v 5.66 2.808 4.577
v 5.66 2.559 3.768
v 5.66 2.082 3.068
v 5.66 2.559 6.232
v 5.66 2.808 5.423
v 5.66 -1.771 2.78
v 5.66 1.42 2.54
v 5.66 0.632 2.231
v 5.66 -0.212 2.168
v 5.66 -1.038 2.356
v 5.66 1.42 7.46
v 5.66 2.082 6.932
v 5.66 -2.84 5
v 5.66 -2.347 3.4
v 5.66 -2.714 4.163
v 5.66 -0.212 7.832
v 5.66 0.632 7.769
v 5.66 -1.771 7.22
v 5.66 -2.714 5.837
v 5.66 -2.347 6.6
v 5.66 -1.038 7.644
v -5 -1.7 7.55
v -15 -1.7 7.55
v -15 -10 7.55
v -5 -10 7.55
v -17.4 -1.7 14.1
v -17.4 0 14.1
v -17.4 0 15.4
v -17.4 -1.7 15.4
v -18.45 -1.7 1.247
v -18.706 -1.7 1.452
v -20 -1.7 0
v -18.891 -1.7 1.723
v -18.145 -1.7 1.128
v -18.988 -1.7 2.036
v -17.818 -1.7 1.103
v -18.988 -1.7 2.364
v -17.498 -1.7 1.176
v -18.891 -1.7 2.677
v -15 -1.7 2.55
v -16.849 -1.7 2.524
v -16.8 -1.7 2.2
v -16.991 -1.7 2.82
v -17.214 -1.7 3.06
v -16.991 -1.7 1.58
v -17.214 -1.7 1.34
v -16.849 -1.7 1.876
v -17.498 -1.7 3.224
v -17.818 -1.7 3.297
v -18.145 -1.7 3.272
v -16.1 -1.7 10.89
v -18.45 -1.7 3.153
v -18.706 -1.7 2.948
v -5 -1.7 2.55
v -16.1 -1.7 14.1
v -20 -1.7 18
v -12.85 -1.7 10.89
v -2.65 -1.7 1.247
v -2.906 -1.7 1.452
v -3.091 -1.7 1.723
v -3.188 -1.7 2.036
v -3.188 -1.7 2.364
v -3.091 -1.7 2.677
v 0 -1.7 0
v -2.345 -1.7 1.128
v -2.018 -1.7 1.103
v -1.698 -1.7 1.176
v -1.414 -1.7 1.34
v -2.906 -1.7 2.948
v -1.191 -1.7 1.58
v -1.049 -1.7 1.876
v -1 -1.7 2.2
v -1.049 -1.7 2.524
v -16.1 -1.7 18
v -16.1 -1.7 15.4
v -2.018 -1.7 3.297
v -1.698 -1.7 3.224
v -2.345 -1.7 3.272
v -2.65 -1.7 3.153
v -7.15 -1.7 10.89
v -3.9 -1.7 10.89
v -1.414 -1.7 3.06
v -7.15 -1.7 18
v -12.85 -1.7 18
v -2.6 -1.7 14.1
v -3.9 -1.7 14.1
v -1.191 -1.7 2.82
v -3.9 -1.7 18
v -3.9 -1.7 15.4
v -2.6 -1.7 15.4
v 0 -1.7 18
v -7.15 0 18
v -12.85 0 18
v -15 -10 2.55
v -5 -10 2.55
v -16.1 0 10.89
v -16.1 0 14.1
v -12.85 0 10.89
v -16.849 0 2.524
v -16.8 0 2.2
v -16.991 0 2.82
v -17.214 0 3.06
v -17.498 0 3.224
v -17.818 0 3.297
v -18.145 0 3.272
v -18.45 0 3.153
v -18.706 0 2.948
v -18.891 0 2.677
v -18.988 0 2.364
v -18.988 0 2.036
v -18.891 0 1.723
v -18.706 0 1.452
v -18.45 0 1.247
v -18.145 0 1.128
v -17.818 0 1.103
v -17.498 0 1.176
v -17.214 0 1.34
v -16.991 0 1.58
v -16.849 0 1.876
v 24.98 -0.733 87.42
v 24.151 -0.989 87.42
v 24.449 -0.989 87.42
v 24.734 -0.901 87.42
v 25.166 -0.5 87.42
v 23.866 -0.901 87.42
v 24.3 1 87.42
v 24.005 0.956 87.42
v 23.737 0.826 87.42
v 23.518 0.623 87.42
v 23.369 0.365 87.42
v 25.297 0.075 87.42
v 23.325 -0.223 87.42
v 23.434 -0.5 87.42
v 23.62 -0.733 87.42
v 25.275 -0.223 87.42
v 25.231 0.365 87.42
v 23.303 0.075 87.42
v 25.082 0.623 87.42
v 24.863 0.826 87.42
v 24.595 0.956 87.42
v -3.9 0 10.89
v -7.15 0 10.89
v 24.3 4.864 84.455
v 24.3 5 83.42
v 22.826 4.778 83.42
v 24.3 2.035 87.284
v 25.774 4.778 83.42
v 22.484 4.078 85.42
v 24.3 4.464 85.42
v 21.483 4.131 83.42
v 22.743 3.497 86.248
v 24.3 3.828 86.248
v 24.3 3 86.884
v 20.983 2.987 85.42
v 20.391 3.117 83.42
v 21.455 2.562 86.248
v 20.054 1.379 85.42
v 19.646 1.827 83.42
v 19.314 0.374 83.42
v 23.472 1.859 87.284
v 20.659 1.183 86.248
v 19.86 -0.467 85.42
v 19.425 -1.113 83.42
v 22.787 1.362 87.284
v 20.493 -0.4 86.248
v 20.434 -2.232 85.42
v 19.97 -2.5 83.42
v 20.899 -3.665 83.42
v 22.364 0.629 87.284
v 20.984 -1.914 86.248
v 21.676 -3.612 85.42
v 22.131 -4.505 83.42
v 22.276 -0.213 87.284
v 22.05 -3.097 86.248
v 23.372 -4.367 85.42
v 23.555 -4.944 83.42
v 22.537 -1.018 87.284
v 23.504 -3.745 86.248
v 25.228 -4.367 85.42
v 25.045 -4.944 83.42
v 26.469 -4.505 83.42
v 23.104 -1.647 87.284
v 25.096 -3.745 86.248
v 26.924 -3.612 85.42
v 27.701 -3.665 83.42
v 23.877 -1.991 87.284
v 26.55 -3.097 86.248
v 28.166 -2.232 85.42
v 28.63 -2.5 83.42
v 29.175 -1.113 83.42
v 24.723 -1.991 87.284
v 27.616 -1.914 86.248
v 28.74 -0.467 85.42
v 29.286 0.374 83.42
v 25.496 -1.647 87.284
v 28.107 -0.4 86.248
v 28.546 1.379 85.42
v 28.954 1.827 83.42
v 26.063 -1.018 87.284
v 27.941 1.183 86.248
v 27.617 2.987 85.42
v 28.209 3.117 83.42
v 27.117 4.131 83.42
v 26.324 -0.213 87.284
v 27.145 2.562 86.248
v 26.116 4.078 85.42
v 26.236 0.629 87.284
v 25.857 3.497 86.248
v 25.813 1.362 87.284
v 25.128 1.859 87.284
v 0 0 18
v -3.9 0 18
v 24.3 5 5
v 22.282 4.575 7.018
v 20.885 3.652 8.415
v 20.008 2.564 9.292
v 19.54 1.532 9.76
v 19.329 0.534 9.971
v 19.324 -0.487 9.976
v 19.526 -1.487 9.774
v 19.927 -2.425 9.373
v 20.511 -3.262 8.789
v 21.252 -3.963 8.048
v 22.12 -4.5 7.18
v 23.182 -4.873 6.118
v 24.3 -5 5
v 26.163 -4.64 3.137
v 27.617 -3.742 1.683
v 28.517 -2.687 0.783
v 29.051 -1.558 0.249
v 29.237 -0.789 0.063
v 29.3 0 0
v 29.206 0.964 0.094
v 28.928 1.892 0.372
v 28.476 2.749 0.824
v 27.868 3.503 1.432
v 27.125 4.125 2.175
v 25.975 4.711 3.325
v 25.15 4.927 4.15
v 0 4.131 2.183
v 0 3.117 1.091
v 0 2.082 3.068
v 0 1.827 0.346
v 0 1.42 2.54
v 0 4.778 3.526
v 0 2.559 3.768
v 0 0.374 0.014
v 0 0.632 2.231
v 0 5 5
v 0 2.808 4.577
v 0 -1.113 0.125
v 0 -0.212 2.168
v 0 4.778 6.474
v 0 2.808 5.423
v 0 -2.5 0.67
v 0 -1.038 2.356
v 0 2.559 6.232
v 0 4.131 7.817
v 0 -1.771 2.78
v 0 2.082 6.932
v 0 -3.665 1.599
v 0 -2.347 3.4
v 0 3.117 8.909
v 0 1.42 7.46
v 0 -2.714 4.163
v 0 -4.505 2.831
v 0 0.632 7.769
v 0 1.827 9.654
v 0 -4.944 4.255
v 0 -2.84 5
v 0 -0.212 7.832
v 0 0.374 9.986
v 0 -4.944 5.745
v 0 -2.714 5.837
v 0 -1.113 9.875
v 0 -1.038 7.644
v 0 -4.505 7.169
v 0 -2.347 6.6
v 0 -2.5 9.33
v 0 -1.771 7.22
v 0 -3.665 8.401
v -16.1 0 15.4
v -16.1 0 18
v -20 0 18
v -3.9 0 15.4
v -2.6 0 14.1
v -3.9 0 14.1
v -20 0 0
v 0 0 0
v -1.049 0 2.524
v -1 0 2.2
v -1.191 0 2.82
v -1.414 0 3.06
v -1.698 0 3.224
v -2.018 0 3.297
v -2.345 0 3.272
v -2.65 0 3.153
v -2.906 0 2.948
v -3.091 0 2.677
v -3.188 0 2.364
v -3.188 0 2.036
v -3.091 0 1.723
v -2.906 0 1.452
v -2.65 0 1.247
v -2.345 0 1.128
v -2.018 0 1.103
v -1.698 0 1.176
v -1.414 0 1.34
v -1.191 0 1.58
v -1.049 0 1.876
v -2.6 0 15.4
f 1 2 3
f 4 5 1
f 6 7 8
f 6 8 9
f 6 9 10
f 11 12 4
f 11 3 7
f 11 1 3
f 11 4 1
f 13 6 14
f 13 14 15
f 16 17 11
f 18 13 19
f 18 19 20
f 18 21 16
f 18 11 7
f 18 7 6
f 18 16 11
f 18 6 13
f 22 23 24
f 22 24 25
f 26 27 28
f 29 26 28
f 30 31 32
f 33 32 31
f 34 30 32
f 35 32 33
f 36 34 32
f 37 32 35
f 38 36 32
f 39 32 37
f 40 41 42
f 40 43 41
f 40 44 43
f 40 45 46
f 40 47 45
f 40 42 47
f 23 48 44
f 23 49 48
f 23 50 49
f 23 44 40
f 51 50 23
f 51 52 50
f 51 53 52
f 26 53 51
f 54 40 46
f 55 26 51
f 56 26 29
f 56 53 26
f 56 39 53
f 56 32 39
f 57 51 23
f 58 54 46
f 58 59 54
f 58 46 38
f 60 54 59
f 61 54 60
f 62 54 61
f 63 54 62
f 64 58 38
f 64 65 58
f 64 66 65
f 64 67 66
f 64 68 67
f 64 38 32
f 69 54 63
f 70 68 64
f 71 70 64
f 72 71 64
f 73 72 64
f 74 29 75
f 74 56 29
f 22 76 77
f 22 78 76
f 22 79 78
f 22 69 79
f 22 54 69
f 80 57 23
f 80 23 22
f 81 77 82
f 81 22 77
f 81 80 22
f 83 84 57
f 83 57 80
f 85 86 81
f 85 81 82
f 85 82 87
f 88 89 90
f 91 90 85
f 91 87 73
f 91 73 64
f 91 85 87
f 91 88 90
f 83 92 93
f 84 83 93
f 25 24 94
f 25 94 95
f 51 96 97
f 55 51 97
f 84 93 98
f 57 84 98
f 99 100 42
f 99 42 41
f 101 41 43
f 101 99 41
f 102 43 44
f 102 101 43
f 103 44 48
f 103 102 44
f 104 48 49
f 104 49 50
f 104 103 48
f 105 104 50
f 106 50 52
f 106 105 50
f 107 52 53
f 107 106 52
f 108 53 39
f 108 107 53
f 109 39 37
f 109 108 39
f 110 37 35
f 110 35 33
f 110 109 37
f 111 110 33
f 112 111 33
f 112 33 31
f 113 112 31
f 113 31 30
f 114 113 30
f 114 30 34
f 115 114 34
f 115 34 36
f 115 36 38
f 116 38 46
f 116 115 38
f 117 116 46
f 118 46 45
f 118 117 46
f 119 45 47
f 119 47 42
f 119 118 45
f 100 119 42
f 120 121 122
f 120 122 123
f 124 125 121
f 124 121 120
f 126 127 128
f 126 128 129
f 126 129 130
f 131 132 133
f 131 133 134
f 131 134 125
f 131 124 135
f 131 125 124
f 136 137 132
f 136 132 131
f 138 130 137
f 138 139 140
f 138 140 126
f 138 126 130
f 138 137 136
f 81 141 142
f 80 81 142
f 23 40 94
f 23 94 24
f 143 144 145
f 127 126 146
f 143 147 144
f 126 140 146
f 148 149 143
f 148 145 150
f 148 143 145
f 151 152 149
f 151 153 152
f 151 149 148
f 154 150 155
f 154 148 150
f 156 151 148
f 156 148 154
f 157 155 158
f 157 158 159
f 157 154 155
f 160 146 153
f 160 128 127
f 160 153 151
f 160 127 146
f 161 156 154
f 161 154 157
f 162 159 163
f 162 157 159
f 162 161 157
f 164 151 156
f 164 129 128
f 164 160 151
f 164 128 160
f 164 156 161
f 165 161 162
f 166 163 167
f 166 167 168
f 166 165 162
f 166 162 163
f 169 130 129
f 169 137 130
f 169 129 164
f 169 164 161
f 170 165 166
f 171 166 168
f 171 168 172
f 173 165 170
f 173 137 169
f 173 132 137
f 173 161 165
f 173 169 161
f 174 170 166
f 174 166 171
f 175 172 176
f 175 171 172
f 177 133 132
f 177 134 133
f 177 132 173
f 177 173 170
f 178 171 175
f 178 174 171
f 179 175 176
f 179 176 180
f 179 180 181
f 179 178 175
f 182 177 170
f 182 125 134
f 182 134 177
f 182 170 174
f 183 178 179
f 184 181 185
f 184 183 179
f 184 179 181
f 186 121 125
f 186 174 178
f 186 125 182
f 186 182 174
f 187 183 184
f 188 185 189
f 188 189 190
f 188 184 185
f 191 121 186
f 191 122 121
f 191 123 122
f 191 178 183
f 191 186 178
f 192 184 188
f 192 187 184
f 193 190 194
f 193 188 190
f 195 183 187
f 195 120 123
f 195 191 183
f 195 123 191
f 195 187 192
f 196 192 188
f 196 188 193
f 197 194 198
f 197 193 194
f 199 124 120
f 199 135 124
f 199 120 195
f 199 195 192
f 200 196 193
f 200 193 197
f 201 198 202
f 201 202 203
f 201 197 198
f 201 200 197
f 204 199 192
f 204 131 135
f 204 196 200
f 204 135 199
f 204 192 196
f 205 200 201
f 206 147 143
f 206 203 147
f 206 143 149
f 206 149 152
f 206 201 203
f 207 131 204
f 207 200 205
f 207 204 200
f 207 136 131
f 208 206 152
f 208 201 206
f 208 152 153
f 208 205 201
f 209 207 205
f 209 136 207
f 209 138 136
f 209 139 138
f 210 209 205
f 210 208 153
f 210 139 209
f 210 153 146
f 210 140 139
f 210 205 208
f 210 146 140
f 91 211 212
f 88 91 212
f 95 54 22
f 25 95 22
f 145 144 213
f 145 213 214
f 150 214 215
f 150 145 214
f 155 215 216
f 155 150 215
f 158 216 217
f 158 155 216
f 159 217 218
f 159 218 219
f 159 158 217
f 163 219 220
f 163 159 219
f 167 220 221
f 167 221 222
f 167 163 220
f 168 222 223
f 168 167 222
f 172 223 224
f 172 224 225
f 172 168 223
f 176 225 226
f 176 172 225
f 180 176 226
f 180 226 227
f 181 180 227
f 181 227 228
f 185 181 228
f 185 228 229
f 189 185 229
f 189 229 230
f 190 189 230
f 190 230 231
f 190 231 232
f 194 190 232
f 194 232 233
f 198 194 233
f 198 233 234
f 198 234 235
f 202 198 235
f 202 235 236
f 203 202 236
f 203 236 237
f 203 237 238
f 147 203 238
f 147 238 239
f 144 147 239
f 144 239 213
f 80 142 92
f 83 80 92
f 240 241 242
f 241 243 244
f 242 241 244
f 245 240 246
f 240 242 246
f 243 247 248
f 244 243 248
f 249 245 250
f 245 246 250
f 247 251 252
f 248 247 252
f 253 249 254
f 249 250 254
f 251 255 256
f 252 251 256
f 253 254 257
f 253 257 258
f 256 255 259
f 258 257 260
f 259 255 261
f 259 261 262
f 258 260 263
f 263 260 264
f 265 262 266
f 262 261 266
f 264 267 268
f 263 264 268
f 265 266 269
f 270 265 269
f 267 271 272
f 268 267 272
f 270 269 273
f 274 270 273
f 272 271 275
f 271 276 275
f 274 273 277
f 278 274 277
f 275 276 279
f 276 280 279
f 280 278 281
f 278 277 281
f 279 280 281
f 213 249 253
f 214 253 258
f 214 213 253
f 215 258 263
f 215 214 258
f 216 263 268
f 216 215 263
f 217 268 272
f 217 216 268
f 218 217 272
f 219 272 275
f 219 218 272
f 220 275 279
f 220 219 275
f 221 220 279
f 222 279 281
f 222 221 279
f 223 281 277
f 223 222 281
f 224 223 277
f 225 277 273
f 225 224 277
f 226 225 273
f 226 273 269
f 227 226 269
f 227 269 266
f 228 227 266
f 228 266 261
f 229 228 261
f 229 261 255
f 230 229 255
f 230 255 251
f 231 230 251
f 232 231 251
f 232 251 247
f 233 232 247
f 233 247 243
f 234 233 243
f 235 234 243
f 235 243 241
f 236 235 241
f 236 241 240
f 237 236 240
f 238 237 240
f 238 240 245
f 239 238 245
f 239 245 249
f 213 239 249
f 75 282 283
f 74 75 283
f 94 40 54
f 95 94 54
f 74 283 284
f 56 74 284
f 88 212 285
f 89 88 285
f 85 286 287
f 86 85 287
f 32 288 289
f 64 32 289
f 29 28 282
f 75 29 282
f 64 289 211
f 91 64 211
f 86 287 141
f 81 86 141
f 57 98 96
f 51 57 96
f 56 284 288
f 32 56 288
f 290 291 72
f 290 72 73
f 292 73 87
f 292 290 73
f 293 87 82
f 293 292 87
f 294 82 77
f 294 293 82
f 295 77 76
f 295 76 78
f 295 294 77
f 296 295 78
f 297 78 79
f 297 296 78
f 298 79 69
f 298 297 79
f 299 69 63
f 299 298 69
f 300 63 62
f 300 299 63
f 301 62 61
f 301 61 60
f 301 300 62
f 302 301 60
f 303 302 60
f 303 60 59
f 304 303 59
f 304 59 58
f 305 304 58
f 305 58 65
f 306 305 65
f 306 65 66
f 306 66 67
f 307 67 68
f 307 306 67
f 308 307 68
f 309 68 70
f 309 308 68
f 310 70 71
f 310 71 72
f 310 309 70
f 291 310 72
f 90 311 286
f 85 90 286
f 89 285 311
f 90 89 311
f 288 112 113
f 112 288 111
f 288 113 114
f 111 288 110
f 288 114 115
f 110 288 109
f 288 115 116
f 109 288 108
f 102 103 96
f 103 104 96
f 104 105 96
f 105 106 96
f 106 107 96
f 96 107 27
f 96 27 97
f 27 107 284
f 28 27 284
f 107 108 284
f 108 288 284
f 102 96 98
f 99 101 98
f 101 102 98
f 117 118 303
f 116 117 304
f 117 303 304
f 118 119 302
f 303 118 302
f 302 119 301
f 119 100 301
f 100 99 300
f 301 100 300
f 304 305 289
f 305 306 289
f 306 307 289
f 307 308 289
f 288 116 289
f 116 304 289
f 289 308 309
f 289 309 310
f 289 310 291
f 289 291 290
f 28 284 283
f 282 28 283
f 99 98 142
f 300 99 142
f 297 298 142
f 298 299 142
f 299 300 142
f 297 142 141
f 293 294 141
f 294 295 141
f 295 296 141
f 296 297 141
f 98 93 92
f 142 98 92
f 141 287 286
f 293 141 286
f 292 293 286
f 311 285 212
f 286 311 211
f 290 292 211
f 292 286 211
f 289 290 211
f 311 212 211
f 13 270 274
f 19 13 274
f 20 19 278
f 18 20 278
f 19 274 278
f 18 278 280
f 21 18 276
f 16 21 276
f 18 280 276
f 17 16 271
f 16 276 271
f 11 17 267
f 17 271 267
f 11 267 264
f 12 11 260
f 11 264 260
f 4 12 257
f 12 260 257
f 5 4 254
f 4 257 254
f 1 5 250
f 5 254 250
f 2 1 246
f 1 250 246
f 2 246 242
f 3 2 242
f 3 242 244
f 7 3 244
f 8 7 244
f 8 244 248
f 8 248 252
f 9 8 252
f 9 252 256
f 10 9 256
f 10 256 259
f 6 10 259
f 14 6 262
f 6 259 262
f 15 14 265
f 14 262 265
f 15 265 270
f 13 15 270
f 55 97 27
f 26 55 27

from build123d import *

# Parameters (mm, degrees)
F1_R     = 5
F3_R     = 4
F4_R     = 2.84
F5_DEPTH = 5.66
F6_R     = 1.1
F6_W     = 10
F6_H     = 5
F7_DEPTH = 1.7
F8_DEPTH = 10


with BuildPart() as f2:
    # F2: sweep along a path in F0
    with BuildLine(Plane.XZ) as f2_path:
        Line((0, 0), (29.3, 0))
        Line((29.3, 0), (29.3, 87.42))
    # F1 (on Right) → F2 (sweep)
    with BuildSketch(Plane.YZ):
        with Locations((0, 5)):
            Circle(F1_R)
    sweep(path=f2_path.line, transition=Transition.RIGHT)

    # F3
    f3_edges = [f2.edges().sort_by_distance(p)[0] for p in [
        (24.3, -5, 87.42),
    ]]
    fillet(f3_edges, radius=F3_R)

    # F4 (on face) → F5 (cut)
    with BuildSketch(Plane(origin=(0, 0, 0), x_dir=(0, -1, 0), z_dir=(-1, 0, 0))):
        with Locations((0, 5)):
            Circle(F4_R)
    extrude(amount=-F5_DEPTH, mode=Mode.SUBTRACT)


with BuildPart() as f7:
    # F6 (on Front) → F7 (new body)
    with BuildSketch(Plane.XZ):
        Polygon((-20, 18), (-20, 0), (0, 0), (0, 18), (-3.9, 18), (-3.9, 15.4), (-2.6, 15.4), (-2.6, 14.1), (-3.9, 14.1), (-3.9, 10.89), (-7.15, 10.89), (-7.15, 18), (-12.85, 18), (-12.85, 10.89), (-16.1, 10.89), (-16.1, 14.1), (-17.4, 14.1), (-17.4, 15.4), (-16.1, 15.4), (-16.1, 18), align=None)
        with Locations((-17.9, 2.2)):
            Circle(F6_R, mode=Mode.SUBTRACT)
        with Locations((-2.1, 2.2)):
            Circle(F6_R, mode=Mode.SUBTRACT)
        with Locations((-10, 5.05)):
            Rectangle(F6_W, F6_H, mode=Mode.SUBTRACT)
    extrude(amount=F7_DEPTH)

    # F6 (on Front) → F8 (join)
    with BuildSketch(Plane.XZ):
        with Locations((-10, 5.05)):
            Rectangle(F6_W, F6_H)
    extrude(amount=F8_DEPTH)


solid = Compound([f2.part, f7.part])
